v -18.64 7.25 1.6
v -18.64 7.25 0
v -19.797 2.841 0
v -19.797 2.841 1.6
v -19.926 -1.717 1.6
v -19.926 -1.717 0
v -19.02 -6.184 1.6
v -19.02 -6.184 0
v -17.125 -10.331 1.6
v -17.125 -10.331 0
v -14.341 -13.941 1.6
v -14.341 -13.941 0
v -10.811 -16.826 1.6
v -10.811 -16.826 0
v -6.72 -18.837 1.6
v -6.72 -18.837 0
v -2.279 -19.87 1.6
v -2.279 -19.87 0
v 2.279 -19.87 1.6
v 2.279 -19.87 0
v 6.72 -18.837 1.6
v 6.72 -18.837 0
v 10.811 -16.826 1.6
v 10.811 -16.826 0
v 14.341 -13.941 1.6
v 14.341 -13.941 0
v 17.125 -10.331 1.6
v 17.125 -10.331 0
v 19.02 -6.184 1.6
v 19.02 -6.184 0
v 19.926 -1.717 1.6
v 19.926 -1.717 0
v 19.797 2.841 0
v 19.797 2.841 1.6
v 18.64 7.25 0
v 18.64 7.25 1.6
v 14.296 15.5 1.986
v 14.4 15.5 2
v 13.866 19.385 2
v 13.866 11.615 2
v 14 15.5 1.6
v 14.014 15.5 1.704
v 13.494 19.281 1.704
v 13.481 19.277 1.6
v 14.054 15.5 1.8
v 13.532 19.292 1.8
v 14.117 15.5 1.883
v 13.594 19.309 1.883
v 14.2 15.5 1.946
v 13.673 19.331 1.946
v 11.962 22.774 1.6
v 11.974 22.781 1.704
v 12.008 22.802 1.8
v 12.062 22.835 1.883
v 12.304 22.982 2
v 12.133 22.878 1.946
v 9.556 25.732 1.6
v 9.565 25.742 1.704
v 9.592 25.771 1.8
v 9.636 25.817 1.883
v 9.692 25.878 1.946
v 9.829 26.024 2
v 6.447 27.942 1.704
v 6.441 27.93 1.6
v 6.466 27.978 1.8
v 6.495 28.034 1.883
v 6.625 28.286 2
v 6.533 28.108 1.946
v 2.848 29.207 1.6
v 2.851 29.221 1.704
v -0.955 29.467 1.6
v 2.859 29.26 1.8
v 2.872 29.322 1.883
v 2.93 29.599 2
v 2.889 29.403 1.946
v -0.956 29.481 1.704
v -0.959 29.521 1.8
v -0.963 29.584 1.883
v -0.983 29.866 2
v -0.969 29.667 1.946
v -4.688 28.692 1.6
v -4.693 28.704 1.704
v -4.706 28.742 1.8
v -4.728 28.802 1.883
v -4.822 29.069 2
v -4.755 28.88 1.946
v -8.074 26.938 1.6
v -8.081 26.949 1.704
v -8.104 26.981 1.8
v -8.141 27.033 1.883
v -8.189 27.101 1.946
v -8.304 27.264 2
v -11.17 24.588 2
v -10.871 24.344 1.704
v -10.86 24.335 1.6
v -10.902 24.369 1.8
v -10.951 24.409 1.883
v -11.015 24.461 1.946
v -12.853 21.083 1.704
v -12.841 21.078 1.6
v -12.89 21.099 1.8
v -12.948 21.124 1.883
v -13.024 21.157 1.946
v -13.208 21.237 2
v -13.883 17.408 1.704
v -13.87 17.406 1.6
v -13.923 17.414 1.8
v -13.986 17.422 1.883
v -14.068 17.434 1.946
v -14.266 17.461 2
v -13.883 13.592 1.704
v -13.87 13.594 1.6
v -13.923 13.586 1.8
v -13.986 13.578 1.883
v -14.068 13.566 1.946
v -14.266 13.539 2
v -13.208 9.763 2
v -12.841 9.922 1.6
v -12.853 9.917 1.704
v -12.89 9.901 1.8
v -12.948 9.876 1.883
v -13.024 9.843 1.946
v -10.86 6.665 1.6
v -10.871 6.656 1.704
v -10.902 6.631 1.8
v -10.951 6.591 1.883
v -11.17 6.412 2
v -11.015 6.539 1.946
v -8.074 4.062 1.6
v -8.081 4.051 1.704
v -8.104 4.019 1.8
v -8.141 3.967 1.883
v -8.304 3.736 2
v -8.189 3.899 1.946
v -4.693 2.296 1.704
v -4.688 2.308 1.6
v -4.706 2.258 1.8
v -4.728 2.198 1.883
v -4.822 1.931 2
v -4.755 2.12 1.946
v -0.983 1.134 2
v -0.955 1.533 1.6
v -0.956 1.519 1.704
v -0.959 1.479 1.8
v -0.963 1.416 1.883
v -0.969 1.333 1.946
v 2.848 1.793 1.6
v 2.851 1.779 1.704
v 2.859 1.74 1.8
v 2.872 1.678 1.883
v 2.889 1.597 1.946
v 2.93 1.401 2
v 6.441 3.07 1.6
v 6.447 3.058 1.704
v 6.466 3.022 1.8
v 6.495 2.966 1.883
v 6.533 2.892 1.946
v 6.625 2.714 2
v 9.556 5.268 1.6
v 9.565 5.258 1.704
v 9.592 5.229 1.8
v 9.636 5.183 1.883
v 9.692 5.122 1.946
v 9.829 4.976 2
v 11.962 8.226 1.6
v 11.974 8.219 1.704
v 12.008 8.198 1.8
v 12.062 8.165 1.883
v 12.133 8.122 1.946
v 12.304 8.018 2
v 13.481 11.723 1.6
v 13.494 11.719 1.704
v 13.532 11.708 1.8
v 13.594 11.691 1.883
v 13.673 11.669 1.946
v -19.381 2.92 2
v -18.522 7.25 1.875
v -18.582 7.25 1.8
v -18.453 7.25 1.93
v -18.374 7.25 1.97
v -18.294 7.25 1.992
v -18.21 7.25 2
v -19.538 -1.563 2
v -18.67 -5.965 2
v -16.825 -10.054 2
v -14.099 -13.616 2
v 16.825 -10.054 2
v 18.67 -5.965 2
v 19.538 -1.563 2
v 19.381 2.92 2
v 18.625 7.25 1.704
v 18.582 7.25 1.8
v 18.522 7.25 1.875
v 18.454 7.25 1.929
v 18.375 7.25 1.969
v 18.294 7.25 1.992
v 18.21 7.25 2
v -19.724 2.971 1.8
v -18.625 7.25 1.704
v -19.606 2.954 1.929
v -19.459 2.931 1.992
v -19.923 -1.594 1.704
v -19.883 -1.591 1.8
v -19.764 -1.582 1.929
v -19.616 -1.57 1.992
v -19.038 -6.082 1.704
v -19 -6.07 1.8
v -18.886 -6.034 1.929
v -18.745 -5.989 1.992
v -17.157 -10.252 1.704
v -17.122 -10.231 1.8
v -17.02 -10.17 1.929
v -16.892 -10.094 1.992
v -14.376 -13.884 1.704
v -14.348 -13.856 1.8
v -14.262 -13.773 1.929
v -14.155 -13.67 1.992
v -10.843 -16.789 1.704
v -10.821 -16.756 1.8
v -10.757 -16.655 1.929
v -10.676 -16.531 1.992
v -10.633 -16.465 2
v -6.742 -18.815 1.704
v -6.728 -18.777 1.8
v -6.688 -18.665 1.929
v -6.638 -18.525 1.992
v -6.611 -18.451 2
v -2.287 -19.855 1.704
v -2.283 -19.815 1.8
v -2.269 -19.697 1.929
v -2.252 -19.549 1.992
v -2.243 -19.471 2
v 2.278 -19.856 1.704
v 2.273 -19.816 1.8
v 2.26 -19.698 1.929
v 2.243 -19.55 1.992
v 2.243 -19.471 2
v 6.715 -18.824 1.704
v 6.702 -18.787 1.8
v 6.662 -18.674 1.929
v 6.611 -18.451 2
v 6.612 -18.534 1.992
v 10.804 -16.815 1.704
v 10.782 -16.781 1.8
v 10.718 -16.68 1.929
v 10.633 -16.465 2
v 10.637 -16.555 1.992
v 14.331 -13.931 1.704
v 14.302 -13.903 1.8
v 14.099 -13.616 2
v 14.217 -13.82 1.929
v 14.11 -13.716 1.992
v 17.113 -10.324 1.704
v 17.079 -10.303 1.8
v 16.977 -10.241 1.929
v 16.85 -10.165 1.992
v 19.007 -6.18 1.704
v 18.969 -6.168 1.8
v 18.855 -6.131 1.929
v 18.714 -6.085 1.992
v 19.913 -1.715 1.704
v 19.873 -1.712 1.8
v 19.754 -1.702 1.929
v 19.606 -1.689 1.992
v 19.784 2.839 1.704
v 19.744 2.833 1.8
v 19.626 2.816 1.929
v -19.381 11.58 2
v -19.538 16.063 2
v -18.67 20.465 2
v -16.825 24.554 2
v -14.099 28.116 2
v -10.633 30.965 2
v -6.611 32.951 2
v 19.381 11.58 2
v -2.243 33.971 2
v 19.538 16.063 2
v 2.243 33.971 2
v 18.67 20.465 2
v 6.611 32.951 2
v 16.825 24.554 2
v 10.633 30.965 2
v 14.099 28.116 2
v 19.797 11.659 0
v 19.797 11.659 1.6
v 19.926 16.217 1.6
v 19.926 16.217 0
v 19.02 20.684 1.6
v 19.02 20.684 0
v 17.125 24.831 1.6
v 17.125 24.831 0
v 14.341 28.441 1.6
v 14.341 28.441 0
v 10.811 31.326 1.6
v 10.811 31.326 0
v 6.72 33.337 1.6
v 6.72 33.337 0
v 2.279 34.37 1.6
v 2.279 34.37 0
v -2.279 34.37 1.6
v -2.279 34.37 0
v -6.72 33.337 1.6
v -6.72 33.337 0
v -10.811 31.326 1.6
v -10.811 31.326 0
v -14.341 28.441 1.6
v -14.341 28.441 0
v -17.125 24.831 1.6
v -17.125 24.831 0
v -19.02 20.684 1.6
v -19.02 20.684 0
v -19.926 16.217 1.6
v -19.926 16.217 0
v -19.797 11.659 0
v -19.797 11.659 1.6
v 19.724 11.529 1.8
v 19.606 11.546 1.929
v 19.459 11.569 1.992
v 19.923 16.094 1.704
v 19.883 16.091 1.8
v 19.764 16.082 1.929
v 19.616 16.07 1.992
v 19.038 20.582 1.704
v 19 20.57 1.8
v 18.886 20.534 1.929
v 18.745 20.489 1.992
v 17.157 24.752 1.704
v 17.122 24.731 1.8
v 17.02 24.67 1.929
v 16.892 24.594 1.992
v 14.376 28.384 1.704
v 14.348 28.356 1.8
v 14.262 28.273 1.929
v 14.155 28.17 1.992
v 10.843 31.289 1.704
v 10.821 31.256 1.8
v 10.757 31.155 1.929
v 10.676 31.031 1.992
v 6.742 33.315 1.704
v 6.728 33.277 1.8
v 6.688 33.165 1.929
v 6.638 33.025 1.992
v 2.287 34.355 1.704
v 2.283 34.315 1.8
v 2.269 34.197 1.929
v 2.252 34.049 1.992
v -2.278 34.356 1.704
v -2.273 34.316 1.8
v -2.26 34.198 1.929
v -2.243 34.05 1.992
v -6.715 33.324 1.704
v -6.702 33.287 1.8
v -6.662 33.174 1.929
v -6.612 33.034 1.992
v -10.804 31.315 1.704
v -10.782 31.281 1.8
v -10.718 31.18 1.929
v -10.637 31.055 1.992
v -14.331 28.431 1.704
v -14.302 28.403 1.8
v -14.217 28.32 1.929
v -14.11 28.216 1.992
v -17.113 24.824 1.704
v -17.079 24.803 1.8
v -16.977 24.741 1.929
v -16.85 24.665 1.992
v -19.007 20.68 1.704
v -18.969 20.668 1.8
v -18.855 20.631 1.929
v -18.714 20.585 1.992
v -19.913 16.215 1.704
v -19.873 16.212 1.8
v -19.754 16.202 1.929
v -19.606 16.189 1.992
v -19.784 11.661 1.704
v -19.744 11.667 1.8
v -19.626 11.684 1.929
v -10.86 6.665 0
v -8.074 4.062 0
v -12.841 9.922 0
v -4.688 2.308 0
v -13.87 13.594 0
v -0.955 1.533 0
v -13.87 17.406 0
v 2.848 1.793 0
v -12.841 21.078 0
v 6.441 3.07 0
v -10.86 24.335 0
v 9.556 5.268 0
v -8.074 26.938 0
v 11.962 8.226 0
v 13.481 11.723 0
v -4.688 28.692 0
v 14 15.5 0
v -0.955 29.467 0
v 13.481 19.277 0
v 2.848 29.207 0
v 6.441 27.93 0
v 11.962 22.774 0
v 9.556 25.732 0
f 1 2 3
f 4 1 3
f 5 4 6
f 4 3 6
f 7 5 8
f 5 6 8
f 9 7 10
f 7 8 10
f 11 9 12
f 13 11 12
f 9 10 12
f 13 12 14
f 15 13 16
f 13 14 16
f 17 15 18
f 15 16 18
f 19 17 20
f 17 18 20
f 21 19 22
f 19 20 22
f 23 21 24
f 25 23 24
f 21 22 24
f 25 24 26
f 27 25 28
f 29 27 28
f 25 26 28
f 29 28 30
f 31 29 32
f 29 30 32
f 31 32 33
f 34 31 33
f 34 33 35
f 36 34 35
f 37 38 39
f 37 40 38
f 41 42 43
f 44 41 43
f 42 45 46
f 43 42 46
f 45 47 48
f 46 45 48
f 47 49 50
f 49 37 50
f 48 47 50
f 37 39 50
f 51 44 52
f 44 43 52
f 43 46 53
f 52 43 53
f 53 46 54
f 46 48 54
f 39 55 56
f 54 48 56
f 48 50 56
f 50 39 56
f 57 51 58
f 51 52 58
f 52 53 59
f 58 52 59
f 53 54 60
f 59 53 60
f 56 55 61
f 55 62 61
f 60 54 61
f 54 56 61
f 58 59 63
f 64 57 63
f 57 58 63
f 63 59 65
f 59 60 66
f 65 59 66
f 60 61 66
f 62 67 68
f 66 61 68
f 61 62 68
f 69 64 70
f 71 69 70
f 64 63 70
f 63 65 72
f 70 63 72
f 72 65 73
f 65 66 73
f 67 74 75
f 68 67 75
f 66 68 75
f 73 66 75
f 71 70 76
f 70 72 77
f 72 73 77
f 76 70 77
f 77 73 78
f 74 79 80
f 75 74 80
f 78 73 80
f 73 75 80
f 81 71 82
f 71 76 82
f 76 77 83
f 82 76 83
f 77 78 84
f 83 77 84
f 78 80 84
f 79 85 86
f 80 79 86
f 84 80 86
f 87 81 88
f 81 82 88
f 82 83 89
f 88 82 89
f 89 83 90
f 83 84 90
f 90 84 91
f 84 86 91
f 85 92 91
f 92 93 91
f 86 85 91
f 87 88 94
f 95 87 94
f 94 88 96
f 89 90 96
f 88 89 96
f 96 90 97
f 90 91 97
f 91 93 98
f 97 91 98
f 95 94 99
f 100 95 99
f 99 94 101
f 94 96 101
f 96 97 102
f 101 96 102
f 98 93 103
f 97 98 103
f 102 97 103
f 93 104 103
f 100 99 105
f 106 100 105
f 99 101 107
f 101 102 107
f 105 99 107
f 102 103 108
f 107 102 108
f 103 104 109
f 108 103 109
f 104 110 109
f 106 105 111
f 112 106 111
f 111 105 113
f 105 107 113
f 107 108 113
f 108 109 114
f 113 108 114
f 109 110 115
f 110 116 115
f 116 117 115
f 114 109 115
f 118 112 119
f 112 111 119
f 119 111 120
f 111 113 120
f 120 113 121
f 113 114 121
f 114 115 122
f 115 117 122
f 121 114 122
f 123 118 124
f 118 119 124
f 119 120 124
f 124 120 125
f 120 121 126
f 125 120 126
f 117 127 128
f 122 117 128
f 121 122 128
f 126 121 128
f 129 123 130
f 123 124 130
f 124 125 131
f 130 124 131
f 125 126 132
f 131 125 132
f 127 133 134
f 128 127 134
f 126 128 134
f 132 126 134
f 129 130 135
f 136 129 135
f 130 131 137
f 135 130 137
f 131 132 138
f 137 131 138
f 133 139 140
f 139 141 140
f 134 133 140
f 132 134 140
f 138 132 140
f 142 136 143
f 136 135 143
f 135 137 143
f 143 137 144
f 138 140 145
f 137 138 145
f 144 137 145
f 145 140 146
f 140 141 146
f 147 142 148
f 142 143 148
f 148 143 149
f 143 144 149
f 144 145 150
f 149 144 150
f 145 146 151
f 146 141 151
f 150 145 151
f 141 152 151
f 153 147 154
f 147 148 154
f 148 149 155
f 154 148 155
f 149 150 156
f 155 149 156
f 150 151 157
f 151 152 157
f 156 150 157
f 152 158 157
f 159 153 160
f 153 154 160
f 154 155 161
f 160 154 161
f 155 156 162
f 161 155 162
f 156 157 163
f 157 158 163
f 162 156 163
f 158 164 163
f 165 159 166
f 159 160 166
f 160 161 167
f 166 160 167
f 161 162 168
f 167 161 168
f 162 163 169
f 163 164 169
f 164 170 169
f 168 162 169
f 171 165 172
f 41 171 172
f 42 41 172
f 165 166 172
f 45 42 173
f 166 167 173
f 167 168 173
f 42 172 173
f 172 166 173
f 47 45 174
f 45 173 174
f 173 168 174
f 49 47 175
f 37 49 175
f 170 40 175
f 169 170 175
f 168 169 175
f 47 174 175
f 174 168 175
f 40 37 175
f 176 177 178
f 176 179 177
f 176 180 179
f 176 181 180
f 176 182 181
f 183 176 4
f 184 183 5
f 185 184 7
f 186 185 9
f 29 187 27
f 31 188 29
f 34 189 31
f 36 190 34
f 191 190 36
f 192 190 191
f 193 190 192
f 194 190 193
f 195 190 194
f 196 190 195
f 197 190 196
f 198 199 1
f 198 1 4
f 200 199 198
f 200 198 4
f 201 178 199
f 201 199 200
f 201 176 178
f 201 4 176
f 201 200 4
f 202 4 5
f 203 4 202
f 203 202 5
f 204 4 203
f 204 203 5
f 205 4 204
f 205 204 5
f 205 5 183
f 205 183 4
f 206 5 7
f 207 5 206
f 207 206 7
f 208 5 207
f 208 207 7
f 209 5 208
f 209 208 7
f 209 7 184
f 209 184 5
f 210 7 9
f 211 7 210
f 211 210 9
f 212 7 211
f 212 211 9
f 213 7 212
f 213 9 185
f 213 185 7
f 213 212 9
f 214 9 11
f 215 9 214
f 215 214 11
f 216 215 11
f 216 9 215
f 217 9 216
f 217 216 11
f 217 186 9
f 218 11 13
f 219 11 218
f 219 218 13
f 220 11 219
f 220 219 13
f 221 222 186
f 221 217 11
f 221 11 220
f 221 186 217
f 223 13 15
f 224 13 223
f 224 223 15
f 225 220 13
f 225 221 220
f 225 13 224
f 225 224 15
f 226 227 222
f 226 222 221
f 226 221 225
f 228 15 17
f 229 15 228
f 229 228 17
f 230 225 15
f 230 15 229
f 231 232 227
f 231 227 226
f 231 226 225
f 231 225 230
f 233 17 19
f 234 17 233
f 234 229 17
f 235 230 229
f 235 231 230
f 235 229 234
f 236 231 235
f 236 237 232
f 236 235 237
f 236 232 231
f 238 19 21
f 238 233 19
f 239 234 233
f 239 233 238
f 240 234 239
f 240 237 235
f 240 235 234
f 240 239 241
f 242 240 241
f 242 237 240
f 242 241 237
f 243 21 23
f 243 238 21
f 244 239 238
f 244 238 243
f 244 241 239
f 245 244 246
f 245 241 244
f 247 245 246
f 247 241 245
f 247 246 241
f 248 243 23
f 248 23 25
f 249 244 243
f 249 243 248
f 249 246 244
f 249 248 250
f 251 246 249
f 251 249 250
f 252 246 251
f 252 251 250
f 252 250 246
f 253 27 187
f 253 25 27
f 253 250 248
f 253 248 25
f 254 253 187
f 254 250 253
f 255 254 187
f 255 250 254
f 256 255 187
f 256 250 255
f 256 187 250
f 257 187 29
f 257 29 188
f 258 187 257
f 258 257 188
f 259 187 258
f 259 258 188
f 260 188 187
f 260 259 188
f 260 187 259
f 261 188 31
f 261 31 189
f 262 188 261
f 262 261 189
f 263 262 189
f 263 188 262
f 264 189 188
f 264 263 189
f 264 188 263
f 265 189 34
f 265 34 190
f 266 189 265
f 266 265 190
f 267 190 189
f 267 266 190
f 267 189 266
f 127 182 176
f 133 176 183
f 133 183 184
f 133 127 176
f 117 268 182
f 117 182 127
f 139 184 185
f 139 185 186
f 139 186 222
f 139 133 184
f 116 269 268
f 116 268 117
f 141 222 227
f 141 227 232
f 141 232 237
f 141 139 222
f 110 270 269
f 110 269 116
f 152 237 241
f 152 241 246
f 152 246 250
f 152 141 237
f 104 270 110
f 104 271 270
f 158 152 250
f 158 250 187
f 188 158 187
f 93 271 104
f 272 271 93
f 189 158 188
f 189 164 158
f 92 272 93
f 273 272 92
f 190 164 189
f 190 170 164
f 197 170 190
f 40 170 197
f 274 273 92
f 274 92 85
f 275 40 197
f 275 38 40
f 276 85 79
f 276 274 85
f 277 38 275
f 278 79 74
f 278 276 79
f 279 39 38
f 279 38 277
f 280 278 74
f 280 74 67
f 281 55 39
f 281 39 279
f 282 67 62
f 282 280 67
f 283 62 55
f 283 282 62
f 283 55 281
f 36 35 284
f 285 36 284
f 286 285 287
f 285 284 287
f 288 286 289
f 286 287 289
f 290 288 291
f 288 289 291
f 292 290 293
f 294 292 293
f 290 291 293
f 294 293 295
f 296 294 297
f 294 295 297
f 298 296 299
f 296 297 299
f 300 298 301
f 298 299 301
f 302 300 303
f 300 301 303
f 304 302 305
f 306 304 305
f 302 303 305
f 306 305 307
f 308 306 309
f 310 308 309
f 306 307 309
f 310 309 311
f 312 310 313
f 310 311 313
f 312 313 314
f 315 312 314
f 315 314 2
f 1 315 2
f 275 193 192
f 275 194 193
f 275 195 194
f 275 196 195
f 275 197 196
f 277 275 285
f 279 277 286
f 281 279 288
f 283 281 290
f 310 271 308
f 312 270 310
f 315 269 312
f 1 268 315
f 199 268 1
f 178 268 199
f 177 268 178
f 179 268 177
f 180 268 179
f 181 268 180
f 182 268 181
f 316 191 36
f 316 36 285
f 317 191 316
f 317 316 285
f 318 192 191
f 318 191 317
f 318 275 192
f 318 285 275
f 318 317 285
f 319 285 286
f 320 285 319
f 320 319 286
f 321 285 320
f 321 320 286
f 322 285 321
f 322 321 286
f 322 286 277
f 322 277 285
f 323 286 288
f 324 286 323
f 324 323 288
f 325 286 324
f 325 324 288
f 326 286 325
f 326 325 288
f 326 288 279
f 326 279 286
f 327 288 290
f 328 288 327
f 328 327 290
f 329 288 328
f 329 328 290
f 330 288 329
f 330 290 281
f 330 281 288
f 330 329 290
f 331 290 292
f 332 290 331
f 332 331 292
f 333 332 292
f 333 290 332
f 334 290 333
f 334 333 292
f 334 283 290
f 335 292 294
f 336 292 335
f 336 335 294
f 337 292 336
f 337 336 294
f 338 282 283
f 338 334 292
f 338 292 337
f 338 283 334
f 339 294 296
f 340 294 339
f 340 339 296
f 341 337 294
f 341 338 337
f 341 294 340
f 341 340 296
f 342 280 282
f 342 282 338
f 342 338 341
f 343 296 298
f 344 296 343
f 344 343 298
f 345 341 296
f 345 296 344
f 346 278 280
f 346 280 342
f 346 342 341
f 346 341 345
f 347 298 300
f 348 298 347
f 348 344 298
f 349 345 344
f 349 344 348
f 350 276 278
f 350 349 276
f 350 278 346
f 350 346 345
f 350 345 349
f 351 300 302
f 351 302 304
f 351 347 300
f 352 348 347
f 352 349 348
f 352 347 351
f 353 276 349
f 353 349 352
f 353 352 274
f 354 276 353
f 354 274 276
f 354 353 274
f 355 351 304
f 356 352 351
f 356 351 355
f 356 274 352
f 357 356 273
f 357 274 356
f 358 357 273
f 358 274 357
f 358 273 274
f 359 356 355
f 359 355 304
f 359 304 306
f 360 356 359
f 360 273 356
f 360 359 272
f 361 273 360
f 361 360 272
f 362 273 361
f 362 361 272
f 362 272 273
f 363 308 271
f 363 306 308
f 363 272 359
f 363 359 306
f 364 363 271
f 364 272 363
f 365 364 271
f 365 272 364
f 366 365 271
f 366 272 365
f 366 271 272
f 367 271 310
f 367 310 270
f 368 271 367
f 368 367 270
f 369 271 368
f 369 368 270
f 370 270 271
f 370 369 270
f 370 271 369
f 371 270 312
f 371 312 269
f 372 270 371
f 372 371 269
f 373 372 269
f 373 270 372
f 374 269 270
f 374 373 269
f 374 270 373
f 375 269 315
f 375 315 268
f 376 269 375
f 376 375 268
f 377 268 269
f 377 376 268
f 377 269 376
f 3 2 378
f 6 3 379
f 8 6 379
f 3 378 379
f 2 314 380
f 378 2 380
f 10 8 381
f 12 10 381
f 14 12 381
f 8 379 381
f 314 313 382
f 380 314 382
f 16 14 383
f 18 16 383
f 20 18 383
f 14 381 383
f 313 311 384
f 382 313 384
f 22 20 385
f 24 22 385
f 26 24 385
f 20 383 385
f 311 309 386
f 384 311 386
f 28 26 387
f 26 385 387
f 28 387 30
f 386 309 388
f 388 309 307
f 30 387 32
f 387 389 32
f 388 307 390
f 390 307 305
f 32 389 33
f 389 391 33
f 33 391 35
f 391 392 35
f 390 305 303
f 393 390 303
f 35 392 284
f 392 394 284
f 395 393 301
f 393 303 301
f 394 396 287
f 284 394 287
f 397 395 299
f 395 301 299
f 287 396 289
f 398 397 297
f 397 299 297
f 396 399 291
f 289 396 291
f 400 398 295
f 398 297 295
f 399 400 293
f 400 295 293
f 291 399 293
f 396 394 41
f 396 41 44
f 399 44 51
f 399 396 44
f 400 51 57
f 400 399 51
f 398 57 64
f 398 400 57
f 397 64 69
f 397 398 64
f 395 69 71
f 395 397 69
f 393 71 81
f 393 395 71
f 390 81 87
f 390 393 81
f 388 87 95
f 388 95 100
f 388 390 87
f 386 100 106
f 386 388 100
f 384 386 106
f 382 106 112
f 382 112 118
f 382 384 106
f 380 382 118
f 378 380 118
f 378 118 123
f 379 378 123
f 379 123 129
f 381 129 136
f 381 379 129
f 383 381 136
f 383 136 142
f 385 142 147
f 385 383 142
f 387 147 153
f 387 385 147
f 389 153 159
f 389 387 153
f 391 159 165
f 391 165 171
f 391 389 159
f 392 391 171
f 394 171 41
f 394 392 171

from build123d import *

# Parameters (mm, degrees)
SZKIC1_R                    = 14
DODANIE_WYCI_GNI_CIE1_DEPTH = 2
ZAOKR_GLENIE1_R             = 0.4


with BuildPart() as part:
    # Szkic1 → Dodanie-wyciągnięcie1 (new body)
    with BuildSketch(Plane.XY):
        with BuildLine():
            ThreePointArc((-18.639675426, 7.25), (0, -20), (18.639675426, 7.25))
            ThreePointArc((18.639675426, 7.25), (0, 34.5), (-18.639675426, 7.25))
        make_face()
        with Locations((0, 15.5)):
            Circle(SZKIC1_R, mode=Mode.SUBTRACT)
    extrude(amount=DODANIE_WYCI_GNI_CIE1_DEPTH)

    # Zaokrąglenie1
    zaokr_glenie1_edges = [part.edges().sort_by_distance(p)[0] for p in [
        (0, 34.5, 2),
        (-14, 15.5, 2),
        (0, -20, 2),
    ]]
    fillet(zaokr_glenie1_edges, radius=ZAOKR_GLENIE1_R)


solid = part.part
